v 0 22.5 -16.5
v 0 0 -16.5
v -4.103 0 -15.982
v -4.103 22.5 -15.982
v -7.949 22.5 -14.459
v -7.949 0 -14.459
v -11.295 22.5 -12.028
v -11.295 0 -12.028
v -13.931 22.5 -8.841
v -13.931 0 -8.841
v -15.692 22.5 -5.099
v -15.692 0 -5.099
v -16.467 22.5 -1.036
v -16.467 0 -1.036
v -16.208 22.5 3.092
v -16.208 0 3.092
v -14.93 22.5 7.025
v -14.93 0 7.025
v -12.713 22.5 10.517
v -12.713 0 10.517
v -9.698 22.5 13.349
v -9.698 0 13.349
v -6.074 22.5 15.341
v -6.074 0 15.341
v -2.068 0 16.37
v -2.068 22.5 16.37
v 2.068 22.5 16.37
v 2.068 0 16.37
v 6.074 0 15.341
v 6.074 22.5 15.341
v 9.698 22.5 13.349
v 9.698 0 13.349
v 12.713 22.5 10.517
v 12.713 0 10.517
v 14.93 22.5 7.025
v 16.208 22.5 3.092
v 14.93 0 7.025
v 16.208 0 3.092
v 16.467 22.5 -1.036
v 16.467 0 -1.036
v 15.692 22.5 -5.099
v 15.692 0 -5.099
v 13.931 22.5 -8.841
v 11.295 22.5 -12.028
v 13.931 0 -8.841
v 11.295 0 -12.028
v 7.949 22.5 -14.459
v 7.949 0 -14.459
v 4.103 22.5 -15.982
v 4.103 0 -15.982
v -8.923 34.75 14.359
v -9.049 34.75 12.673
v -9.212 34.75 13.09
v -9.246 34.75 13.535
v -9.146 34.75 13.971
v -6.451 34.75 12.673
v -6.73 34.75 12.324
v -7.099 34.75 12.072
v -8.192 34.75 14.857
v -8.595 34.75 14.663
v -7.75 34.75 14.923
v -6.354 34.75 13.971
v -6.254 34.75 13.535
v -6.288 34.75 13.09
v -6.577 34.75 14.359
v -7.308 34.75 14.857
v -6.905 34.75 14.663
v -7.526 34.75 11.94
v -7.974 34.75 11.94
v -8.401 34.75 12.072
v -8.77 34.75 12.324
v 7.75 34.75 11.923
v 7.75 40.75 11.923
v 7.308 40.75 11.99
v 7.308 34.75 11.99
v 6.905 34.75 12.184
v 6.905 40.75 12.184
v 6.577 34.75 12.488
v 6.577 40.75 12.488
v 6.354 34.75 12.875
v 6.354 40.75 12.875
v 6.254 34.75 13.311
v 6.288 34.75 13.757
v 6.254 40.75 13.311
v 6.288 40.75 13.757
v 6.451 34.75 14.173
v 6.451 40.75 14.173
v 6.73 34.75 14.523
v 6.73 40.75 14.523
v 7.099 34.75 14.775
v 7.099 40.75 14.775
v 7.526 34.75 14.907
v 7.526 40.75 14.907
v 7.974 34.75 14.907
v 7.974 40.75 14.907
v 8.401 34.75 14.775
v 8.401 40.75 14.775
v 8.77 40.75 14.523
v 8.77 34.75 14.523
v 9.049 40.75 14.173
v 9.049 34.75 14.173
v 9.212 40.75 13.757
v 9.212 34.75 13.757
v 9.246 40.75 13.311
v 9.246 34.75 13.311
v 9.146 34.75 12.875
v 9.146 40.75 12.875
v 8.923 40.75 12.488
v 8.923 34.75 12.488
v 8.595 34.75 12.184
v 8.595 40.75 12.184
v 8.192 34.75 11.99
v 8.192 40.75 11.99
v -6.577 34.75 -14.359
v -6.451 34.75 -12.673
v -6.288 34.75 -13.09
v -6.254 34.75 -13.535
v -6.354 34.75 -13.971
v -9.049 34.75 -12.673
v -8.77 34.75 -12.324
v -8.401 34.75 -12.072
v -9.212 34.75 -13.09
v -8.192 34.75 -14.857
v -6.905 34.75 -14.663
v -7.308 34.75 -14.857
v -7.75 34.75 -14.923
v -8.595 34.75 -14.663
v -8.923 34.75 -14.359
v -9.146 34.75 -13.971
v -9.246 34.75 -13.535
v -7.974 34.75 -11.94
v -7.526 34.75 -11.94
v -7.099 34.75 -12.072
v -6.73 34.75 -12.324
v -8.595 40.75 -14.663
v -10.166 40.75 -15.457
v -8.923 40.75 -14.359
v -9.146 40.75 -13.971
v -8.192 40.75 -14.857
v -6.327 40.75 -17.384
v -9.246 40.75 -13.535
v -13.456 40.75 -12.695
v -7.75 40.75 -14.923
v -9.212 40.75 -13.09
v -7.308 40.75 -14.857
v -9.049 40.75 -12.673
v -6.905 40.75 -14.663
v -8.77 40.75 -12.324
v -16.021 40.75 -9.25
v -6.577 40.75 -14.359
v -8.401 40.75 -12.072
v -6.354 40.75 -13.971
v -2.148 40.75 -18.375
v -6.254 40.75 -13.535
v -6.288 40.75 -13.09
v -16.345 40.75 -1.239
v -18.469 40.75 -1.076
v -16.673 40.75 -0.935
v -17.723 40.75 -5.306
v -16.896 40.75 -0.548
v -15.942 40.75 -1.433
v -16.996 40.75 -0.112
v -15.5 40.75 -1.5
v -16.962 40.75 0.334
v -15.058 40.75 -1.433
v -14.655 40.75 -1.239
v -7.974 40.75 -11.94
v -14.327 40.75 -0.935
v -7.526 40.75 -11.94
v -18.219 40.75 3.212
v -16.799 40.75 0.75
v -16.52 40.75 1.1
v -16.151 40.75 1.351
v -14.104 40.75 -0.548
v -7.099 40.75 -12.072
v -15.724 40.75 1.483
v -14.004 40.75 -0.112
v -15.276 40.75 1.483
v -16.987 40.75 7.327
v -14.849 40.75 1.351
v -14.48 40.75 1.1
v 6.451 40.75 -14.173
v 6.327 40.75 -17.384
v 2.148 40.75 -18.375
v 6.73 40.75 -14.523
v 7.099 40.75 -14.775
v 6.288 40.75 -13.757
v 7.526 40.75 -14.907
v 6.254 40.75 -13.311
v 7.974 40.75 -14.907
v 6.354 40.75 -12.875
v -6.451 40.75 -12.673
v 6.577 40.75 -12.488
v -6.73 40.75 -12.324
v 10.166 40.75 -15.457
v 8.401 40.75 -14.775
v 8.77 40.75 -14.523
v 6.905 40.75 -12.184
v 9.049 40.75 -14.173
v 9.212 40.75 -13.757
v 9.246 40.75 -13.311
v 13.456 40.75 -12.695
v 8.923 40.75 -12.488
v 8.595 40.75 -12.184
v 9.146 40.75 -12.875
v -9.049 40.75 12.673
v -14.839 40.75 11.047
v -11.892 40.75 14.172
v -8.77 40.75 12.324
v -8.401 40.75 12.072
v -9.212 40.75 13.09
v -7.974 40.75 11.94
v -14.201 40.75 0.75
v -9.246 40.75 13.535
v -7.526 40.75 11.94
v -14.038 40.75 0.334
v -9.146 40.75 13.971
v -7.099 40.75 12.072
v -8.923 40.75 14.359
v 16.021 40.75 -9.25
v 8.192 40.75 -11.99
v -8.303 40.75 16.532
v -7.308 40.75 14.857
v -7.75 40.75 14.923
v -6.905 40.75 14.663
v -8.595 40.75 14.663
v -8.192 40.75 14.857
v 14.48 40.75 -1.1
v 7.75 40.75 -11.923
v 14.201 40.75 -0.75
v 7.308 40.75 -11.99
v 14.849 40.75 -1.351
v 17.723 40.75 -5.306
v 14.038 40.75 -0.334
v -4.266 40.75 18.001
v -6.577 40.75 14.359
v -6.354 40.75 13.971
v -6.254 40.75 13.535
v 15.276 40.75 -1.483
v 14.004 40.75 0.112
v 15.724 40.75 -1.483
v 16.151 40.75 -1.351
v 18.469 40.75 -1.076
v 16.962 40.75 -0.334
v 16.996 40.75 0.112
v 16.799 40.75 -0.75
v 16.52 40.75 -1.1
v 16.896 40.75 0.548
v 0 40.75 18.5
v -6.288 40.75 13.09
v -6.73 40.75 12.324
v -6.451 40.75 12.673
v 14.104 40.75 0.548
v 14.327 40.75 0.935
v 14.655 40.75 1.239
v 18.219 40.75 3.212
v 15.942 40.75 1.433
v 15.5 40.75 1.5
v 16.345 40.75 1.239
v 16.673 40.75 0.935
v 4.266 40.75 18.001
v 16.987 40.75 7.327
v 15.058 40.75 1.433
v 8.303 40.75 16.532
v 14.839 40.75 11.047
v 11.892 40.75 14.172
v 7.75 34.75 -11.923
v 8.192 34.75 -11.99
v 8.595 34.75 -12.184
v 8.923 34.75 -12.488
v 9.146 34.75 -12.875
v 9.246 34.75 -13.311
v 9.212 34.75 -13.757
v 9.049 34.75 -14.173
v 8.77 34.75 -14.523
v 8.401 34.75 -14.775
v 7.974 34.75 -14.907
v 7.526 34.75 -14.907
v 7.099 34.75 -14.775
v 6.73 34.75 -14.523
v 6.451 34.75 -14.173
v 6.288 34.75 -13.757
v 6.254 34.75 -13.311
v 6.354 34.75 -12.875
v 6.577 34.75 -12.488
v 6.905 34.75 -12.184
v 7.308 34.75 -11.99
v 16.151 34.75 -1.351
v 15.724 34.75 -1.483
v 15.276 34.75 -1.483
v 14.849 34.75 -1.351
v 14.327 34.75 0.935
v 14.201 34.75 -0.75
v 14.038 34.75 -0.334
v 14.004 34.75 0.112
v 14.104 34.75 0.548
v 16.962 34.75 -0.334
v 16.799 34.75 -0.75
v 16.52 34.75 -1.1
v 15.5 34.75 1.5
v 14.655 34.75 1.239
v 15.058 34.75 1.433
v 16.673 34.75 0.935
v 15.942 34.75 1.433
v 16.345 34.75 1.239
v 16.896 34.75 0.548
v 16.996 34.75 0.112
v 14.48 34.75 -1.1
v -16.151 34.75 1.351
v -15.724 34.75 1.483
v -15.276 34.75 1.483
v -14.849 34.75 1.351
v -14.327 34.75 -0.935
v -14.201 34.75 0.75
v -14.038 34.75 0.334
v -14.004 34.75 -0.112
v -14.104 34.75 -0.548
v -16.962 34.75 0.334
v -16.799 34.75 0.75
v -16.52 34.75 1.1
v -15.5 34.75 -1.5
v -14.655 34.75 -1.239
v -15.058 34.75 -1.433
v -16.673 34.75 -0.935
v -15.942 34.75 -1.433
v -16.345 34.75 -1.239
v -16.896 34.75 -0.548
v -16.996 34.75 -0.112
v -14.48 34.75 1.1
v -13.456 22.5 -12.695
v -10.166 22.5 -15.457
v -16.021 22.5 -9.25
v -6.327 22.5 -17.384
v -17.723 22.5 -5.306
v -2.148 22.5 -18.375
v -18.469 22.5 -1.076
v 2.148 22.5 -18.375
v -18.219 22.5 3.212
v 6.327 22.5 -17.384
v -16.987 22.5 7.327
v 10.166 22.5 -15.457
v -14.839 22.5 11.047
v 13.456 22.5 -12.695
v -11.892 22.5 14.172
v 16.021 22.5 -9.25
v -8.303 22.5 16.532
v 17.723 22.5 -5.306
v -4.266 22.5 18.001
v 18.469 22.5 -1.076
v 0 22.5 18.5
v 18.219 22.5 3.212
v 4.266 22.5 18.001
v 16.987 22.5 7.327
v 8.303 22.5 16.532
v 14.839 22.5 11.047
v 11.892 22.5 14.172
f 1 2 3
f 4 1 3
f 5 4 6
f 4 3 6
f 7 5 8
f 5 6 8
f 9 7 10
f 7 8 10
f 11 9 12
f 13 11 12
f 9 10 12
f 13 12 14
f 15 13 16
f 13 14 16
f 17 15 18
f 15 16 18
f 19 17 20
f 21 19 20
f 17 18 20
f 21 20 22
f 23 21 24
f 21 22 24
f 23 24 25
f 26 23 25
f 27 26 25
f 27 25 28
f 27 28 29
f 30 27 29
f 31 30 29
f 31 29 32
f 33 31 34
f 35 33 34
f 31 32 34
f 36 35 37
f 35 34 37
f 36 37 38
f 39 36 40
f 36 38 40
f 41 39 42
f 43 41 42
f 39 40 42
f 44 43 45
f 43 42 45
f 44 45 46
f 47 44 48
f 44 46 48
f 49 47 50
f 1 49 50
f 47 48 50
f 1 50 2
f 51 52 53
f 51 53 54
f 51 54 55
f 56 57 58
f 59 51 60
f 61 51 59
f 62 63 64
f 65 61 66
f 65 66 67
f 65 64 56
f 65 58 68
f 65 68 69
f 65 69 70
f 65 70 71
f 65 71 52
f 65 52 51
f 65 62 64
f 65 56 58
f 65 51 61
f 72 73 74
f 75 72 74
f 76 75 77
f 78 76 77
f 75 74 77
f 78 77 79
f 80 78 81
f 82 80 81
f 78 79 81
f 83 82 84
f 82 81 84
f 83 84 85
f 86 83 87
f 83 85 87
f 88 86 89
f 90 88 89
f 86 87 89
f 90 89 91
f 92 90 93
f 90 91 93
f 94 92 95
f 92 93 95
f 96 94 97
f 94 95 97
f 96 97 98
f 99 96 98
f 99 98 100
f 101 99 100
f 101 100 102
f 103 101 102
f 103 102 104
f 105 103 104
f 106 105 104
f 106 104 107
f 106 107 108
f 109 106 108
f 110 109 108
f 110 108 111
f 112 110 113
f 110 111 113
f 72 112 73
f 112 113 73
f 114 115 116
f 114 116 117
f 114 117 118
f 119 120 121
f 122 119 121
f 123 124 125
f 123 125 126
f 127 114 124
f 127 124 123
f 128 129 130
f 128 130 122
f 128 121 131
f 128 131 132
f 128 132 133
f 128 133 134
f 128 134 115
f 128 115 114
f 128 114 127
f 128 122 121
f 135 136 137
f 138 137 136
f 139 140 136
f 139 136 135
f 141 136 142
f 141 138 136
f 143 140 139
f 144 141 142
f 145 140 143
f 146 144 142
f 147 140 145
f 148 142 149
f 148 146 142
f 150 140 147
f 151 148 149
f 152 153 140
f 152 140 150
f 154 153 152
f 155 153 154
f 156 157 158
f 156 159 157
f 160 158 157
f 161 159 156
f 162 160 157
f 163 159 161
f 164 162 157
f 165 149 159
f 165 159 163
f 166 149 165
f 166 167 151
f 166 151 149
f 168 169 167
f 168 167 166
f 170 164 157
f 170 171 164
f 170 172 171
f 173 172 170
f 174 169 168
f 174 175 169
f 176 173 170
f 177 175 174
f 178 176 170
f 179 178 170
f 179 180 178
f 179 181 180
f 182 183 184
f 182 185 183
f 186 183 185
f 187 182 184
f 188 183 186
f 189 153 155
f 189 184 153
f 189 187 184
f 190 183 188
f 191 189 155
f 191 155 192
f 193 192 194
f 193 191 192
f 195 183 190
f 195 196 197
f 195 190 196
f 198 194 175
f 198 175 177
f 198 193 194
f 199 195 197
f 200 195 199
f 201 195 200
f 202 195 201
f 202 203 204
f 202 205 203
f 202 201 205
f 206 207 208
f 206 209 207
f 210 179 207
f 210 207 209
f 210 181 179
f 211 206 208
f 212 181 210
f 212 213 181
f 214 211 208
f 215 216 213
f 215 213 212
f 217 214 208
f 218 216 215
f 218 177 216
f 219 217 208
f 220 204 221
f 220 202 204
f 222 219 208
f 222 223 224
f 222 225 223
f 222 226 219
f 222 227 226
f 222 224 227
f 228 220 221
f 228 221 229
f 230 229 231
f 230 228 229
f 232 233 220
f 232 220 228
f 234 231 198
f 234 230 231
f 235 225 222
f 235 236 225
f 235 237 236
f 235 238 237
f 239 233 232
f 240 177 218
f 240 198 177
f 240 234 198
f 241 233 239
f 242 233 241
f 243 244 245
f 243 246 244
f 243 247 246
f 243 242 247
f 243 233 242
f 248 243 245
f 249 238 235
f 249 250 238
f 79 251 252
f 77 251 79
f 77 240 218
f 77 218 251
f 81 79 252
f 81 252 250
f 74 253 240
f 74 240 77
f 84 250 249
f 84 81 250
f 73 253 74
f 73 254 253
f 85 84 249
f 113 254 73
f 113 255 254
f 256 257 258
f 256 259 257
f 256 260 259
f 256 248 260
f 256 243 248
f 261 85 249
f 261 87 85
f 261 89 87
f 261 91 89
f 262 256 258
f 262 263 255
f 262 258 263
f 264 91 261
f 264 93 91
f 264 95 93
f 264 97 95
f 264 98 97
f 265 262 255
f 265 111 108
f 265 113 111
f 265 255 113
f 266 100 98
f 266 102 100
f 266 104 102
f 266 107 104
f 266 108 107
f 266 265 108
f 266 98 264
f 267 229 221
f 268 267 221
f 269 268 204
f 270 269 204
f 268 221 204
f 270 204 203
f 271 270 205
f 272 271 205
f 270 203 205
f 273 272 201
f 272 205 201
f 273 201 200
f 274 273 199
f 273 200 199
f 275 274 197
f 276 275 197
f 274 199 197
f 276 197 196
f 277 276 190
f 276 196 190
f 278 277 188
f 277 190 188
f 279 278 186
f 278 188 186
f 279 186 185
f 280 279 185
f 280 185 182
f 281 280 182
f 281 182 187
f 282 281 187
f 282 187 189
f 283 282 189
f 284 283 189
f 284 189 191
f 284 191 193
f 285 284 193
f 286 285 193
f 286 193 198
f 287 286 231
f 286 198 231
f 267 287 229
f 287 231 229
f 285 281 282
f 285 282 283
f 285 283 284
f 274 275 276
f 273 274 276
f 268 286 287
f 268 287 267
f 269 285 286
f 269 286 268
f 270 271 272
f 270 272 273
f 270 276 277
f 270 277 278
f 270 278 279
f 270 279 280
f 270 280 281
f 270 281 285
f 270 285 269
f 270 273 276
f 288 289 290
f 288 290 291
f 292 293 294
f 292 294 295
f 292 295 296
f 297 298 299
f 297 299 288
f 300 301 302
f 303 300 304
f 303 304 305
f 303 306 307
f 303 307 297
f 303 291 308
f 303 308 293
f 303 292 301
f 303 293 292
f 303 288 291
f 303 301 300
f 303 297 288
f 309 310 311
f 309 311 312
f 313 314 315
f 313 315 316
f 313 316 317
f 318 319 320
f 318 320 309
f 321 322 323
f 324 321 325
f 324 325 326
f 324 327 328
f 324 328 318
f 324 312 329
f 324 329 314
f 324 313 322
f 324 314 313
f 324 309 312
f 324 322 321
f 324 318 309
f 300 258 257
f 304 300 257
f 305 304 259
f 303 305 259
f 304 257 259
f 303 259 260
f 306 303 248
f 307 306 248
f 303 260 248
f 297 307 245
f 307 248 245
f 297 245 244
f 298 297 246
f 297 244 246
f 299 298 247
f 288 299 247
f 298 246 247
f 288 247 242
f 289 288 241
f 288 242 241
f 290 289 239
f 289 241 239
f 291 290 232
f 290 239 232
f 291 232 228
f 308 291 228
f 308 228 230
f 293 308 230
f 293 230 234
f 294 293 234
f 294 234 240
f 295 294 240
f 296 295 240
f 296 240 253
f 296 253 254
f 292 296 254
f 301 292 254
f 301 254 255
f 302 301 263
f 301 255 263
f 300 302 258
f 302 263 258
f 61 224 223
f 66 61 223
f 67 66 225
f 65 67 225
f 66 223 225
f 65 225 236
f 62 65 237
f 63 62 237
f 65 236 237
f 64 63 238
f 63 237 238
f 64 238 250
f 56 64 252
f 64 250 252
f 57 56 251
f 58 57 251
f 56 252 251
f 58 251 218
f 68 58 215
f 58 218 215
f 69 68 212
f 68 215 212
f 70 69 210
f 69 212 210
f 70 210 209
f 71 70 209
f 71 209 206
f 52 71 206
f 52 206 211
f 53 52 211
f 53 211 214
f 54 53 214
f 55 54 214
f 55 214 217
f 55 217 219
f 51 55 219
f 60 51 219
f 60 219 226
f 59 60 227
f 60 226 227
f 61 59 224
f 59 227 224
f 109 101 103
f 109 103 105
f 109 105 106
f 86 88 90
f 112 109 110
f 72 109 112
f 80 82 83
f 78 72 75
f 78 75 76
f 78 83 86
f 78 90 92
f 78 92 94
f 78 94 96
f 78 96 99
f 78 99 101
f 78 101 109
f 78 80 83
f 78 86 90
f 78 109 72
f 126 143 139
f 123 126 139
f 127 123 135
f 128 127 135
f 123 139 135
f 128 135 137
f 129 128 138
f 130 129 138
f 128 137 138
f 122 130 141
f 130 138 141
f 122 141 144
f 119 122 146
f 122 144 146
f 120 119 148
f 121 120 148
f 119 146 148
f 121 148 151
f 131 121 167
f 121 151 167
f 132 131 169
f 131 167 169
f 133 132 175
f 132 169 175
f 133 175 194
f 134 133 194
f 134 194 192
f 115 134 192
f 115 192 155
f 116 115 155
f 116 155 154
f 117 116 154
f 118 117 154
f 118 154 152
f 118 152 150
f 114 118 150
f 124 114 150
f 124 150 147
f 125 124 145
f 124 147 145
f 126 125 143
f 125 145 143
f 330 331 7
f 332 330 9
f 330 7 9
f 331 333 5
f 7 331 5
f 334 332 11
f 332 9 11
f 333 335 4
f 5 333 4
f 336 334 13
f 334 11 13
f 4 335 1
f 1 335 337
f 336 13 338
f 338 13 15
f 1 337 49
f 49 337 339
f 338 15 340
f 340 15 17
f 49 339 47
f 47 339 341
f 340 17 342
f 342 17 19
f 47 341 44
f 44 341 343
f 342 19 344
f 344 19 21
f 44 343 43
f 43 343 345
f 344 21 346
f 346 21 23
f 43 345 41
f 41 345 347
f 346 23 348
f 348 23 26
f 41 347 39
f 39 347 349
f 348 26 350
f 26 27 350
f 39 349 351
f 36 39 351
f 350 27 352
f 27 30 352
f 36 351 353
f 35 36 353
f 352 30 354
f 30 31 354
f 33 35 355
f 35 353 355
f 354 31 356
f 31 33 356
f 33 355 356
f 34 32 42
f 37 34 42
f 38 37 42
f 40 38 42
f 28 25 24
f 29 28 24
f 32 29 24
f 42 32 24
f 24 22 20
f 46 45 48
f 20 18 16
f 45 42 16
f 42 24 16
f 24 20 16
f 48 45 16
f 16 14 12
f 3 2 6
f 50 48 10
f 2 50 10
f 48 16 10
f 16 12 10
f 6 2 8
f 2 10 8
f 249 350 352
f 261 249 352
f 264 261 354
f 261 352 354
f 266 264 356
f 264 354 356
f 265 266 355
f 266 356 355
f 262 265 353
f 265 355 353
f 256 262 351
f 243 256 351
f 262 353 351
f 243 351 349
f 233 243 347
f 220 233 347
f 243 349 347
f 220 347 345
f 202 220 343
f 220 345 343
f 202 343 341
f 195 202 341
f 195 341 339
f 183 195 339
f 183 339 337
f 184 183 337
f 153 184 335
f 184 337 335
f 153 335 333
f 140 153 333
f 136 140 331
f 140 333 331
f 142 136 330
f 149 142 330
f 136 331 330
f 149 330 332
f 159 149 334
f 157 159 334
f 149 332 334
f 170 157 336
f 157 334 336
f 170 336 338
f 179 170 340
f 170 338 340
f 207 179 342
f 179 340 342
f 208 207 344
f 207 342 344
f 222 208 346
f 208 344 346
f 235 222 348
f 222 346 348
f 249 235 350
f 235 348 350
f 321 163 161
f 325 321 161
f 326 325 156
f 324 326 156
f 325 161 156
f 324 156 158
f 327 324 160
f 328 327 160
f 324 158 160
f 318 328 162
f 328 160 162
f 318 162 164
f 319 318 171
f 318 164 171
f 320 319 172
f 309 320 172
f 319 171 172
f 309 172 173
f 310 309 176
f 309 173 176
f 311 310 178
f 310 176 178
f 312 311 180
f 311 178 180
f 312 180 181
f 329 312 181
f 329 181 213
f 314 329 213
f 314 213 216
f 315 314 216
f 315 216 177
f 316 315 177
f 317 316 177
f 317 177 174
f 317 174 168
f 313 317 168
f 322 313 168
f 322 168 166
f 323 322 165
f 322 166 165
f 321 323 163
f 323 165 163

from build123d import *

# Parameters (mm, degrees)
SKETCH1_R           = 16.5
BOSS_EXTRUDE1_DEPTH = 22.5
SKETCH2_R           = 18.5
BOSS_EXTRUDE2_DEPTH = 18.25
SKETCH7_R           = 1.5
CUT_EXTRUDE2_DEPTH  = 6


with BuildPart() as part:
    # Sketch1 → Boss-Extrude1 (new body)
    with BuildSketch(Plane(origin=(0, 0, 0), x_dir=(1, 0, 0), z_dir=(0, 1, 0))):
        with Locations(Location((0, 0, 0), (0, 0, 90))):
            Circle(SKETCH1_R)
    extrude(amount=BOSS_EXTRUDE1_DEPTH)

    # Sketch2 → Boss-Extrude2 (add)
    with BuildSketch(Plane(origin=(0, 22.5, 0), x_dir=(1, 0, 0), z_dir=(0, 1, 0))):
        with Locations(Location((0, 0, 0), (0, 0, 270))):
            Circle(SKETCH2_R)
    extrude(amount=BOSS_EXTRUDE2_DEPTH)

    # Sketch7 → Cut-Extrude2 (cut)
    with BuildSketch(Plane(origin=(0, 40.75, 0), x_dir=(1, 0, 0), z_dir=(0, 1, 0))):
        with Locations(Location((15.5, 0, 0), (0, 0, 270))):
            Circle(SKETCH7_R)
        with Locations(Location((7.75, 13.423393759, 0), (0, 0, 270))):
            Circle(SKETCH7_R)
        with Locations(Location((-15.5, 0, 0), (0, 0, 90))):
            Circle(SKETCH7_R)
        with Locations(Location((-7.75, 13.423393759, 0), (0, 0, 90))):
            Circle(SKETCH7_R)
        with Locations(Location((7.75, -13.423393759, 0), (0, 0, 90))):
            Circle(SKETCH7_R)
        with Locations(Location((-7.75, -13.423393759, 0), (0, 0, 270))):
            Circle(SKETCH7_R)
    extrude(amount=-CUT_EXTRUDE2_DEPTH, mode=Mode.SUBTRACT)


solid = part.part
